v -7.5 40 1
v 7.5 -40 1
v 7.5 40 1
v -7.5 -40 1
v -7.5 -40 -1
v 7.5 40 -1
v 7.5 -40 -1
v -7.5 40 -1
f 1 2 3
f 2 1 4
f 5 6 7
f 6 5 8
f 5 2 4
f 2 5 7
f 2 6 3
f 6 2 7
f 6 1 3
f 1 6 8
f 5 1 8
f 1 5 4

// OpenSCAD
n_slats = 6; //number of blades in the wheel
r_wheel = 30; //overall radius of the wheel
t_wheel = 3; //thickness of the wheel
rot = 360/n_slats; //angle of rotation for the chosen number of slats
s_thick=2; //thickness of the wheel blades
s_width=15; //width of the blades
h_blade=80; //lenght of the blades
h_nut = 20; //length of the piece that turns the wheel
nut_size = 10; //radius of the piece that turns the wheel

blade();
//wwheel();

module blade(){
cube([s_width,h_blade,s_thick],center=true);
}

module wwheel(){
	difference(){
		union(){
			wheel();
			nut();
		}
		slats();
	}
}

module slats(){
for (i=[1:n_slats]){
	rotate([0,0,rot*i]){
		translate([0,r_wheel-s_width+5,0]){
			cube([s_thick+0.6,s_width+0.6,100],center=true);
		}
	}
}
}

module wheel(){
translate([0,0,t_wheel/2]){
for (i=[1:n_slats]){
	rotate([0,0,rot*i]){
		translate([0,r_wheel/2,0]){
			cube([s_thick*2+0.6,r_wheel,t_wheel],center=true);
		}
	}
}
}
}

module nut(){
$fn=5;
translate([0,0,h_nut/2]){
cylinder(h=h_nut,r=nut_size,center=true);
}
}
